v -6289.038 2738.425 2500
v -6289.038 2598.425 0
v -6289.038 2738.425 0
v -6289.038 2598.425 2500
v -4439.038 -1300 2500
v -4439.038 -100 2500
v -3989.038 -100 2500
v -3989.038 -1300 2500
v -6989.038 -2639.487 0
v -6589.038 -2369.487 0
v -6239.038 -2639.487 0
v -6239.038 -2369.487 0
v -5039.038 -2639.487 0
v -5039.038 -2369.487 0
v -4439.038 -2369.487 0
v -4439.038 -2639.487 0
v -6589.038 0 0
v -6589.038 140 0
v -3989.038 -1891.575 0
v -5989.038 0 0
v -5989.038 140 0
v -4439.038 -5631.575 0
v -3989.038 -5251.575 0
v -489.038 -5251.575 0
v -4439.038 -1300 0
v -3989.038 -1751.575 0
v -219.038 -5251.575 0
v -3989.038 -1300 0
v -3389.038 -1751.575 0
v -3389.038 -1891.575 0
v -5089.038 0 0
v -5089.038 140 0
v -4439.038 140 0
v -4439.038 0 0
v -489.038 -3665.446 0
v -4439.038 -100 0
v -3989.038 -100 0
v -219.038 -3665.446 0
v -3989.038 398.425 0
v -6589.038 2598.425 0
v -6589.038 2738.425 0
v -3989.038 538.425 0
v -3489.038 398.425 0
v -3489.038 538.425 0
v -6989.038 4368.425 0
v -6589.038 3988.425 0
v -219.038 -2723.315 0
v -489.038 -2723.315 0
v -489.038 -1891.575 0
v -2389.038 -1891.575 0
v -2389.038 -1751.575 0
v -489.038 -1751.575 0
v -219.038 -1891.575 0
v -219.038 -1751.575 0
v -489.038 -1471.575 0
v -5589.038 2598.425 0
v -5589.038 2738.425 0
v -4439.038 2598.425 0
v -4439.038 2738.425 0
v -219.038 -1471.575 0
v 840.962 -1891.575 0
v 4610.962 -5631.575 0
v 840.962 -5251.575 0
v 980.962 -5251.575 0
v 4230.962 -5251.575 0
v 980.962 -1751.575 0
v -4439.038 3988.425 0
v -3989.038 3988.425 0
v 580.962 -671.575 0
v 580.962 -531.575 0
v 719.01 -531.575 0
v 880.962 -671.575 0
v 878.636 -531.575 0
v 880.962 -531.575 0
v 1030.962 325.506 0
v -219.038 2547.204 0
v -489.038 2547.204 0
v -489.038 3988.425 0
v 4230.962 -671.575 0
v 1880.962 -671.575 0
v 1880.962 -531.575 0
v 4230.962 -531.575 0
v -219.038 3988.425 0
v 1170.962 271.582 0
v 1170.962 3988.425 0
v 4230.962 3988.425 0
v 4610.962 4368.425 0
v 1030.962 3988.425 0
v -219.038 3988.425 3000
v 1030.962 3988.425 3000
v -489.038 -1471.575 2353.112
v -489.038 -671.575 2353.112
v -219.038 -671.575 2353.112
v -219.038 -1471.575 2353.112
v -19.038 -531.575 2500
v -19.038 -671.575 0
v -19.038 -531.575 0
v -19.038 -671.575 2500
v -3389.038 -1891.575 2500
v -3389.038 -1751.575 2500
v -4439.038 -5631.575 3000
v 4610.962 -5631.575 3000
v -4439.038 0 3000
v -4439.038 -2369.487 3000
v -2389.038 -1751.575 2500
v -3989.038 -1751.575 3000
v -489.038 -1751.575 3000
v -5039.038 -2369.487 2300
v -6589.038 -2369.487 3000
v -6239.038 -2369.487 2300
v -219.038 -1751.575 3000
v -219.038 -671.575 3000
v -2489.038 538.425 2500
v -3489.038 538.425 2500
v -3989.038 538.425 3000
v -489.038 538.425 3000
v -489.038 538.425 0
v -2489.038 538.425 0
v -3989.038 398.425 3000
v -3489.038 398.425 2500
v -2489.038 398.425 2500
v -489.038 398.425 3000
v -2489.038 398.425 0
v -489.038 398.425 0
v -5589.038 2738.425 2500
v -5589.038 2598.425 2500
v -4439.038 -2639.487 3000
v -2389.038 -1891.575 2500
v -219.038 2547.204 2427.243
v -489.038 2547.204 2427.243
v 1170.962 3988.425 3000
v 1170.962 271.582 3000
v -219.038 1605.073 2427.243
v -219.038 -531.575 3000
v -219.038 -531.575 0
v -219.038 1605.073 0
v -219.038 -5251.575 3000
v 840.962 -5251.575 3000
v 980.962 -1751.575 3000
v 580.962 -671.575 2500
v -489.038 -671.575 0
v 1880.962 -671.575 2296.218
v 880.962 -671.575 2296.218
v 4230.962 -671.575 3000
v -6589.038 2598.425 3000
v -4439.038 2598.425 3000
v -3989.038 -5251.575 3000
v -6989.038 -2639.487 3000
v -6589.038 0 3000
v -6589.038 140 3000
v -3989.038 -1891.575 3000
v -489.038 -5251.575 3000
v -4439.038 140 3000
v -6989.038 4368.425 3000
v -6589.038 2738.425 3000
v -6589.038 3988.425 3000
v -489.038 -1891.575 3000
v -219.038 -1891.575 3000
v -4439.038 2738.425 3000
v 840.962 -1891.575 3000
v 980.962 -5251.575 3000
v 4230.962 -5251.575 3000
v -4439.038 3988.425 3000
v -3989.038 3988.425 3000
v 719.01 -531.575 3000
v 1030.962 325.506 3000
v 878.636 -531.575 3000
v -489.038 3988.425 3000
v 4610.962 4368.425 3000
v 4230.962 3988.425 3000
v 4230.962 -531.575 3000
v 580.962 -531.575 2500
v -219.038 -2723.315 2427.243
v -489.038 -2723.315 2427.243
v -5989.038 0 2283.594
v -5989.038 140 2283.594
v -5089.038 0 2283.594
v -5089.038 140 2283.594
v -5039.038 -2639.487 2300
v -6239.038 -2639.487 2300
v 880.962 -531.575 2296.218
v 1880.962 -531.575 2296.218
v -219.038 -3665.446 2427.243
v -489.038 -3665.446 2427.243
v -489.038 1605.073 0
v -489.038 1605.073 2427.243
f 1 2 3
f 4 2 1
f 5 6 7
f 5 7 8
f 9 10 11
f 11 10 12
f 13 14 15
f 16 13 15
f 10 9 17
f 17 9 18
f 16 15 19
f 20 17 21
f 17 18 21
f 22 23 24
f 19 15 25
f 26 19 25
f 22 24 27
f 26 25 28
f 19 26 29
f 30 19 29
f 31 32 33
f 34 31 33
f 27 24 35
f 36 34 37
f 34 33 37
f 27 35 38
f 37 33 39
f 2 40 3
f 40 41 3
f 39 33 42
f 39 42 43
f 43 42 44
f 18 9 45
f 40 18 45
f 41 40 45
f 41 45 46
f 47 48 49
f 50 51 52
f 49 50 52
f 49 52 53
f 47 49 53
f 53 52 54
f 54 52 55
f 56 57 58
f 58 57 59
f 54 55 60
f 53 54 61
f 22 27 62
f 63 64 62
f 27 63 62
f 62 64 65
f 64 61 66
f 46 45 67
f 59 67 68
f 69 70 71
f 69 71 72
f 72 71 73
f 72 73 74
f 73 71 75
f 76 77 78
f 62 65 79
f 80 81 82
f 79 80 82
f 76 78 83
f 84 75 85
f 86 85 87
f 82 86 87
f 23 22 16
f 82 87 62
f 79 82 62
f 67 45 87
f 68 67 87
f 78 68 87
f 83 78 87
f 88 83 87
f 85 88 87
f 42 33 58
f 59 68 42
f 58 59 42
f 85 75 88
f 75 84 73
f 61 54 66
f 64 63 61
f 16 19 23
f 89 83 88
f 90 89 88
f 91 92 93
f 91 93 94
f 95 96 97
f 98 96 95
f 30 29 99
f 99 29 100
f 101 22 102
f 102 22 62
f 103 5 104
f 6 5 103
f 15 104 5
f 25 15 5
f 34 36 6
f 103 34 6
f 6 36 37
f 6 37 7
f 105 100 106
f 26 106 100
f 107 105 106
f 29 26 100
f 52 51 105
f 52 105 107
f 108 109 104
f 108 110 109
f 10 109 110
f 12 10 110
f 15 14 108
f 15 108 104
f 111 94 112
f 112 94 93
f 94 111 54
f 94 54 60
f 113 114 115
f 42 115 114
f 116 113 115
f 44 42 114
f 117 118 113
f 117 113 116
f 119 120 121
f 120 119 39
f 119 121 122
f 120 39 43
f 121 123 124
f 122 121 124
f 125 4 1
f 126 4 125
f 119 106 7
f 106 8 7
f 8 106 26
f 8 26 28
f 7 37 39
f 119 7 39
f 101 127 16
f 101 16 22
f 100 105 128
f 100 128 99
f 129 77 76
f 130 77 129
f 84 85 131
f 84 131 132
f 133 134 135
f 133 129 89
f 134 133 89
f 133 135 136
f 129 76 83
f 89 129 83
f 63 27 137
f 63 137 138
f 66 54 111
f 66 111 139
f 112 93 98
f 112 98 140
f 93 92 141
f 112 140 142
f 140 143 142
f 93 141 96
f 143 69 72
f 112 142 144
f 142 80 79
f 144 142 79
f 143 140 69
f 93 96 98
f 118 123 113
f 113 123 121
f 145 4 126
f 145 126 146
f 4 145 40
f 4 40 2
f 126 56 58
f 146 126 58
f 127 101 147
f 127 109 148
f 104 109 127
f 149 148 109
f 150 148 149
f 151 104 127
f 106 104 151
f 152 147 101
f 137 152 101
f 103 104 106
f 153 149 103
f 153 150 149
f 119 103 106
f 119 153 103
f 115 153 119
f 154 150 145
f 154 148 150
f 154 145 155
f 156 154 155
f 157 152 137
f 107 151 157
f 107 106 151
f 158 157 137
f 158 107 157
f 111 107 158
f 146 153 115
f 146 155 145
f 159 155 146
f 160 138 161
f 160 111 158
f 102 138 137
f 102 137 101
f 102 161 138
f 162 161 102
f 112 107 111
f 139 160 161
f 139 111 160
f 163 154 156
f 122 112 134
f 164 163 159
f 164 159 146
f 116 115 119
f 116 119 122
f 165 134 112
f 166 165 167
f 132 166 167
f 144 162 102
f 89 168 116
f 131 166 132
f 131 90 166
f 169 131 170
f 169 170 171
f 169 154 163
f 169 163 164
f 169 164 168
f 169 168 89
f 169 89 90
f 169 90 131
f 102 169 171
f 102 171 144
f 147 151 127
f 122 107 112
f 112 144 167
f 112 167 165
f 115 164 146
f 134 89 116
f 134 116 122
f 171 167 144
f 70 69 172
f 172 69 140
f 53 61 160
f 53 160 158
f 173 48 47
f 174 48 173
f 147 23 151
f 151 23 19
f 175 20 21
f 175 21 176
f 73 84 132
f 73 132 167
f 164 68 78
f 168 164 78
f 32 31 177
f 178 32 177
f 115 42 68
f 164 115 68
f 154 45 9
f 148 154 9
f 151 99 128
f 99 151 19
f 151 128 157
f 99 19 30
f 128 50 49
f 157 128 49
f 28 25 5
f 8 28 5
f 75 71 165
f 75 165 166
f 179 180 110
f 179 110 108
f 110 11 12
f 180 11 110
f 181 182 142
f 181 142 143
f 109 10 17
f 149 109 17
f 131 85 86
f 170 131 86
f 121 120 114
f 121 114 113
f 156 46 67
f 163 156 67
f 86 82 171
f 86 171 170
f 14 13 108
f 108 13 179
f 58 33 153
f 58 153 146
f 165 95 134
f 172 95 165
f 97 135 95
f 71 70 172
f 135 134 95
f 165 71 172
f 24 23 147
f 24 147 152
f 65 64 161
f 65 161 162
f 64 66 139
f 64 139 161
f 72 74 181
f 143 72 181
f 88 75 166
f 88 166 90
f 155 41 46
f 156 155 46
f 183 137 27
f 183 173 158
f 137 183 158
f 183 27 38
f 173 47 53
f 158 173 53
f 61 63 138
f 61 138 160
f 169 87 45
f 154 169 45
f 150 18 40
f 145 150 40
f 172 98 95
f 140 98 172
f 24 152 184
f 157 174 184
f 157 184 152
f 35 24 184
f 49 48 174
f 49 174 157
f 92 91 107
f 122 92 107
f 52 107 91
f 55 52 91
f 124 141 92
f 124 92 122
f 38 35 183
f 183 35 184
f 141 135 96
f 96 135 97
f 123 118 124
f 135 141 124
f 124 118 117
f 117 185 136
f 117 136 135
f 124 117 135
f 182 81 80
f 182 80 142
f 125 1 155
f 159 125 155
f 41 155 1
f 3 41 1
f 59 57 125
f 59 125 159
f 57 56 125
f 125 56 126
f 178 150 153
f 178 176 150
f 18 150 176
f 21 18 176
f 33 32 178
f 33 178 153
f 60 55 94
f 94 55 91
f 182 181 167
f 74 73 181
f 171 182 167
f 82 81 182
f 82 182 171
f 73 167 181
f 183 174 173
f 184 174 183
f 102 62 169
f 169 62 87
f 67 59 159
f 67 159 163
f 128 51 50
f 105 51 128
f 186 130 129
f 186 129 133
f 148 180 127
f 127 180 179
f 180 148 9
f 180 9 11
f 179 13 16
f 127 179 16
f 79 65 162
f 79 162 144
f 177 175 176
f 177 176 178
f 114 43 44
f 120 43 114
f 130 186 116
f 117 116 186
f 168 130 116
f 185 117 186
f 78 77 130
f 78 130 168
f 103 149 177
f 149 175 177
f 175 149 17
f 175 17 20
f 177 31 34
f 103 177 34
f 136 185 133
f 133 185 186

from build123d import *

# Parameters (mm, degrees)
F0_W      = 3500
F0_H      = 3360
F0_W_2    = 2150
F0_H_2    = 2369.4872627268
F0_H_3    = 2150
F0_W_3    = 4450
F0_H_4    = 4580
F0_H_5    = 2458.4248518944
F0_H_6    = 1250
F0_H_7    = 3450
F0_H_8    = 4520
F1_DEPTH  = 3000
F2_W      = 1200
F2_H      = 2300
F3_DEPTH  = 270
F4_W      = 900
F4_H      = 2283.5940655647
F5_DEPTH  = 140
F6_W      = 700
F6_H      = 2500
F7_DEPTH  = 140
F8_W      = 1200
F8_H      = 2500
F9_DEPTH  = 450
F10_W     = 1000
F10_H     = 2500
F11_DEPTH = 140
F12_W     = 1000
F12_H     = 2500
F13_DEPTH = 140
F14_W     = 1000
F14_H     = 2296.2177407754
F15_DEPTH = 140
F16_W     = 942.1310424805
F16_H     = 2427.2427558899
F17_DEPTH = 270
F18_W     = 800
F18_H     = 2353.111743927
F19_DEPTH = 270
F20_W     = 600
F20_H     = 2500
F21_DEPTH = 140
F23_DEPTH = 3000
F25_DEPTH = 3000


with BuildPart() as f1:
    # F0 (on Top) → F1 (new body)
    with BuildSketch(Plane.XY):
        Polygon((4610.9616947174, 4368.4248518944), (-6989.0383052826, 4368.4248518944), (-6989.0383052826, -2639.4872627268), (-4439.0383052826, -2639.4872627268), (-4439.0383052826, -5631.5751481056), (4610.9616947174, -5631.5751481056), align=None)
        with Locations((-2239.0383052826, -3571.5751481056)):
            Rectangle(F0_W, F0_H, mode=Mode.SUBTRACT)
        with Locations((-5514.0383052826, -1184.7436313634)):
            Rectangle(F0_W_2, F0_H_2, mode=Mode.SUBTRACT)
        with Locations((-2239.0383052826, -676.5751481056)):
            Rectangle(F0_W, F0_H_3, mode=Mode.SUBTRACT)
        with Locations((2005.9616947174, -2961.5751481056)):
            Rectangle(F0_W_3, F0_H_4, mode=Mode.SUBTRACT)
        with Locations((-5514.0383052826, 1369.2124259472)):
            Rectangle(F0_W_2, F0_H_5, mode=Mode.SUBTRACT)
        with Locations((-5514.0383052826, 3363.4248518944)):
            Rectangle(F0_W_2, F0_H_6, mode=Mode.SUBTRACT)
        with Locations((-2239.0383052826, 2263.4248518944)):
            Rectangle(F0_W, F0_H_7, mode=Mode.SUBTRACT)
        with Locations((2005.9616947174, 1728.4248518944)):
            Rectangle(F0_W_3, F0_H_8, mode=Mode.SUBTRACT)
    extrude(amount=F1_DEPTH)

    # F2 (on face) → F3 (cut, through all)
    with BuildSketch(Plane.XZ.offset(2639.4872627268)):
        with Locations((-5639.0383052826, 1150)):
            Rectangle(F2_W, F2_H)
    extrude(amount=-F3_DEPTH, mode=Mode.SUBTRACT)

    # F4 (on face) → F5 (cut, through all)
    with BuildSketch(Plane.XZ):
        with Locations((-5539.0383052826, 1141.7970327824)):
            Rectangle(F4_W, F4_H)
    extrude(amount=-F5_DEPTH, mode=Mode.SUBTRACT)

    # F6 (on face) → F7 (cut, through all)
    with BuildSketch(Plane.XZ.offset(-2598.4248518944)):
        with Locations((-5939.0383052826, 1250)):
            Rectangle(F6_W, F6_H)
    extrude(amount=-F7_DEPTH, mode=Mode.SUBTRACT)

    # F8 (on face) → F9 (cut, through all)
    with BuildSketch(Plane(origin=(-4439.0383052826, 0, 0), x_dir=(0, -1, 0), z_dir=(-1, 0, 0))):
        with Locations((700, 1250)):
            Rectangle(F8_W, F8_H)
    extrude(amount=-F9_DEPTH, mode=Mode.SUBTRACT)

    # F10 (on face) → F11 (cut, through all)
    with BuildSketch(Plane.XZ.offset(-398.4248518944)):
        with Locations((-2989.0383052826, 1250)):
            Rectangle(F10_W, F10_H)
    extrude(amount=-F11_DEPTH, mode=Mode.SUBTRACT)

    # F12 (on face) → F13 (cut, through all)
    with BuildSketch(Plane(origin=(0, -1751.5751481056, 0), x_dir=(-1, 0, 0), z_dir=(0, 1, 0))):
        with Locations((2889.0383052826, 1250)):
            Rectangle(F12_W, F12_H)
    extrude(amount=-F13_DEPTH, mode=Mode.SUBTRACT)

    # F14 (on face) → F15 (cut, through all)
    with BuildSketch(Plane(origin=(0, -531.5751481056, 0), x_dir=(-1, 0, 0), z_dir=(0, 1, 0))):
        with Locations((-1380.9616947174, 1148.1088703877)):
            Rectangle(F14_W, F14_H)
    extrude(amount=-F15_DEPTH, mode=Mode.SUBTRACT)

    # F16 (on face) → F17 (cut, through all)
    with BuildSketch(Plane(origin=(-489.0383052826, 0, 0), x_dir=(0, -1, 0), z_dir=(-1, 0, 0))):
        with Locations((3194.3805217743, 1213.6213779449)):
            Rectangle(F16_W, F16_H)
        with Locations((-2076.1382579803, 1213.6213779449)):
            Rectangle(F16_W, F16_H)
    extrude(amount=-F17_DEPTH, mode=Mode.SUBTRACT)

    # F18 (on face) → F19 (cut, through all)
    with BuildSketch(Plane(origin=(-489.0383052826, 0, 0), x_dir=(0, -1, 0), z_dir=(-1, 0, 0))):
        with Locations((1071.5751481056, 1176.5558719635)):
            Rectangle(F18_W, F18_H)
    extrude(amount=-F19_DEPTH, mode=Mode.SUBTRACT)

    # F20 (on face) → F21 (cut, through all)
    with BuildSketch(Plane.XZ.offset(671.5751481056)):
        with Locations((280.9616947174, 1250)):
            Rectangle(F20_W, F20_H)
    extrude(amount=-F21_DEPTH, mode=Mode.SUBTRACT)

    # F22 (on face) → F23 (join, through all)
    with BuildSketch(Plane(origin=(0, 0, 0), x_dir=(1, 0, 0), z_dir=(0, 0, -1))):
        Polygon((1030.9616947174, -3988.4248518944), (1170.9616947174, -3988.4248518944), (1170.9616947174, -271.582269817), (878.6363011635, 531.5751481056), (719.0096352921, 531.5751481056), (1030.9616947174, -325.5060911179), align=None)
    extrude(amount=-F23_DEPTH)

    # F24 (on face) → F25 (join, through all)
    with BuildSketch(Plane(origin=(0, 0, 0), x_dir=(1, 0, 0), z_dir=(0, 0, -1))):
        Polygon((840.9616947174, 1891.5751481056), (-219.0383052826, 1891.5751481056), (-219.0383052826, 1751.5751481056), (980.9616947174, 1751.5751481056), (980.9616947174, 1891.5751481056), (980.9616947174, 5251.5751481056), (840.9616947174, 5251.5751481056), align=None)
    extrude(amount=-F25_DEPTH)


solid = f1.part
